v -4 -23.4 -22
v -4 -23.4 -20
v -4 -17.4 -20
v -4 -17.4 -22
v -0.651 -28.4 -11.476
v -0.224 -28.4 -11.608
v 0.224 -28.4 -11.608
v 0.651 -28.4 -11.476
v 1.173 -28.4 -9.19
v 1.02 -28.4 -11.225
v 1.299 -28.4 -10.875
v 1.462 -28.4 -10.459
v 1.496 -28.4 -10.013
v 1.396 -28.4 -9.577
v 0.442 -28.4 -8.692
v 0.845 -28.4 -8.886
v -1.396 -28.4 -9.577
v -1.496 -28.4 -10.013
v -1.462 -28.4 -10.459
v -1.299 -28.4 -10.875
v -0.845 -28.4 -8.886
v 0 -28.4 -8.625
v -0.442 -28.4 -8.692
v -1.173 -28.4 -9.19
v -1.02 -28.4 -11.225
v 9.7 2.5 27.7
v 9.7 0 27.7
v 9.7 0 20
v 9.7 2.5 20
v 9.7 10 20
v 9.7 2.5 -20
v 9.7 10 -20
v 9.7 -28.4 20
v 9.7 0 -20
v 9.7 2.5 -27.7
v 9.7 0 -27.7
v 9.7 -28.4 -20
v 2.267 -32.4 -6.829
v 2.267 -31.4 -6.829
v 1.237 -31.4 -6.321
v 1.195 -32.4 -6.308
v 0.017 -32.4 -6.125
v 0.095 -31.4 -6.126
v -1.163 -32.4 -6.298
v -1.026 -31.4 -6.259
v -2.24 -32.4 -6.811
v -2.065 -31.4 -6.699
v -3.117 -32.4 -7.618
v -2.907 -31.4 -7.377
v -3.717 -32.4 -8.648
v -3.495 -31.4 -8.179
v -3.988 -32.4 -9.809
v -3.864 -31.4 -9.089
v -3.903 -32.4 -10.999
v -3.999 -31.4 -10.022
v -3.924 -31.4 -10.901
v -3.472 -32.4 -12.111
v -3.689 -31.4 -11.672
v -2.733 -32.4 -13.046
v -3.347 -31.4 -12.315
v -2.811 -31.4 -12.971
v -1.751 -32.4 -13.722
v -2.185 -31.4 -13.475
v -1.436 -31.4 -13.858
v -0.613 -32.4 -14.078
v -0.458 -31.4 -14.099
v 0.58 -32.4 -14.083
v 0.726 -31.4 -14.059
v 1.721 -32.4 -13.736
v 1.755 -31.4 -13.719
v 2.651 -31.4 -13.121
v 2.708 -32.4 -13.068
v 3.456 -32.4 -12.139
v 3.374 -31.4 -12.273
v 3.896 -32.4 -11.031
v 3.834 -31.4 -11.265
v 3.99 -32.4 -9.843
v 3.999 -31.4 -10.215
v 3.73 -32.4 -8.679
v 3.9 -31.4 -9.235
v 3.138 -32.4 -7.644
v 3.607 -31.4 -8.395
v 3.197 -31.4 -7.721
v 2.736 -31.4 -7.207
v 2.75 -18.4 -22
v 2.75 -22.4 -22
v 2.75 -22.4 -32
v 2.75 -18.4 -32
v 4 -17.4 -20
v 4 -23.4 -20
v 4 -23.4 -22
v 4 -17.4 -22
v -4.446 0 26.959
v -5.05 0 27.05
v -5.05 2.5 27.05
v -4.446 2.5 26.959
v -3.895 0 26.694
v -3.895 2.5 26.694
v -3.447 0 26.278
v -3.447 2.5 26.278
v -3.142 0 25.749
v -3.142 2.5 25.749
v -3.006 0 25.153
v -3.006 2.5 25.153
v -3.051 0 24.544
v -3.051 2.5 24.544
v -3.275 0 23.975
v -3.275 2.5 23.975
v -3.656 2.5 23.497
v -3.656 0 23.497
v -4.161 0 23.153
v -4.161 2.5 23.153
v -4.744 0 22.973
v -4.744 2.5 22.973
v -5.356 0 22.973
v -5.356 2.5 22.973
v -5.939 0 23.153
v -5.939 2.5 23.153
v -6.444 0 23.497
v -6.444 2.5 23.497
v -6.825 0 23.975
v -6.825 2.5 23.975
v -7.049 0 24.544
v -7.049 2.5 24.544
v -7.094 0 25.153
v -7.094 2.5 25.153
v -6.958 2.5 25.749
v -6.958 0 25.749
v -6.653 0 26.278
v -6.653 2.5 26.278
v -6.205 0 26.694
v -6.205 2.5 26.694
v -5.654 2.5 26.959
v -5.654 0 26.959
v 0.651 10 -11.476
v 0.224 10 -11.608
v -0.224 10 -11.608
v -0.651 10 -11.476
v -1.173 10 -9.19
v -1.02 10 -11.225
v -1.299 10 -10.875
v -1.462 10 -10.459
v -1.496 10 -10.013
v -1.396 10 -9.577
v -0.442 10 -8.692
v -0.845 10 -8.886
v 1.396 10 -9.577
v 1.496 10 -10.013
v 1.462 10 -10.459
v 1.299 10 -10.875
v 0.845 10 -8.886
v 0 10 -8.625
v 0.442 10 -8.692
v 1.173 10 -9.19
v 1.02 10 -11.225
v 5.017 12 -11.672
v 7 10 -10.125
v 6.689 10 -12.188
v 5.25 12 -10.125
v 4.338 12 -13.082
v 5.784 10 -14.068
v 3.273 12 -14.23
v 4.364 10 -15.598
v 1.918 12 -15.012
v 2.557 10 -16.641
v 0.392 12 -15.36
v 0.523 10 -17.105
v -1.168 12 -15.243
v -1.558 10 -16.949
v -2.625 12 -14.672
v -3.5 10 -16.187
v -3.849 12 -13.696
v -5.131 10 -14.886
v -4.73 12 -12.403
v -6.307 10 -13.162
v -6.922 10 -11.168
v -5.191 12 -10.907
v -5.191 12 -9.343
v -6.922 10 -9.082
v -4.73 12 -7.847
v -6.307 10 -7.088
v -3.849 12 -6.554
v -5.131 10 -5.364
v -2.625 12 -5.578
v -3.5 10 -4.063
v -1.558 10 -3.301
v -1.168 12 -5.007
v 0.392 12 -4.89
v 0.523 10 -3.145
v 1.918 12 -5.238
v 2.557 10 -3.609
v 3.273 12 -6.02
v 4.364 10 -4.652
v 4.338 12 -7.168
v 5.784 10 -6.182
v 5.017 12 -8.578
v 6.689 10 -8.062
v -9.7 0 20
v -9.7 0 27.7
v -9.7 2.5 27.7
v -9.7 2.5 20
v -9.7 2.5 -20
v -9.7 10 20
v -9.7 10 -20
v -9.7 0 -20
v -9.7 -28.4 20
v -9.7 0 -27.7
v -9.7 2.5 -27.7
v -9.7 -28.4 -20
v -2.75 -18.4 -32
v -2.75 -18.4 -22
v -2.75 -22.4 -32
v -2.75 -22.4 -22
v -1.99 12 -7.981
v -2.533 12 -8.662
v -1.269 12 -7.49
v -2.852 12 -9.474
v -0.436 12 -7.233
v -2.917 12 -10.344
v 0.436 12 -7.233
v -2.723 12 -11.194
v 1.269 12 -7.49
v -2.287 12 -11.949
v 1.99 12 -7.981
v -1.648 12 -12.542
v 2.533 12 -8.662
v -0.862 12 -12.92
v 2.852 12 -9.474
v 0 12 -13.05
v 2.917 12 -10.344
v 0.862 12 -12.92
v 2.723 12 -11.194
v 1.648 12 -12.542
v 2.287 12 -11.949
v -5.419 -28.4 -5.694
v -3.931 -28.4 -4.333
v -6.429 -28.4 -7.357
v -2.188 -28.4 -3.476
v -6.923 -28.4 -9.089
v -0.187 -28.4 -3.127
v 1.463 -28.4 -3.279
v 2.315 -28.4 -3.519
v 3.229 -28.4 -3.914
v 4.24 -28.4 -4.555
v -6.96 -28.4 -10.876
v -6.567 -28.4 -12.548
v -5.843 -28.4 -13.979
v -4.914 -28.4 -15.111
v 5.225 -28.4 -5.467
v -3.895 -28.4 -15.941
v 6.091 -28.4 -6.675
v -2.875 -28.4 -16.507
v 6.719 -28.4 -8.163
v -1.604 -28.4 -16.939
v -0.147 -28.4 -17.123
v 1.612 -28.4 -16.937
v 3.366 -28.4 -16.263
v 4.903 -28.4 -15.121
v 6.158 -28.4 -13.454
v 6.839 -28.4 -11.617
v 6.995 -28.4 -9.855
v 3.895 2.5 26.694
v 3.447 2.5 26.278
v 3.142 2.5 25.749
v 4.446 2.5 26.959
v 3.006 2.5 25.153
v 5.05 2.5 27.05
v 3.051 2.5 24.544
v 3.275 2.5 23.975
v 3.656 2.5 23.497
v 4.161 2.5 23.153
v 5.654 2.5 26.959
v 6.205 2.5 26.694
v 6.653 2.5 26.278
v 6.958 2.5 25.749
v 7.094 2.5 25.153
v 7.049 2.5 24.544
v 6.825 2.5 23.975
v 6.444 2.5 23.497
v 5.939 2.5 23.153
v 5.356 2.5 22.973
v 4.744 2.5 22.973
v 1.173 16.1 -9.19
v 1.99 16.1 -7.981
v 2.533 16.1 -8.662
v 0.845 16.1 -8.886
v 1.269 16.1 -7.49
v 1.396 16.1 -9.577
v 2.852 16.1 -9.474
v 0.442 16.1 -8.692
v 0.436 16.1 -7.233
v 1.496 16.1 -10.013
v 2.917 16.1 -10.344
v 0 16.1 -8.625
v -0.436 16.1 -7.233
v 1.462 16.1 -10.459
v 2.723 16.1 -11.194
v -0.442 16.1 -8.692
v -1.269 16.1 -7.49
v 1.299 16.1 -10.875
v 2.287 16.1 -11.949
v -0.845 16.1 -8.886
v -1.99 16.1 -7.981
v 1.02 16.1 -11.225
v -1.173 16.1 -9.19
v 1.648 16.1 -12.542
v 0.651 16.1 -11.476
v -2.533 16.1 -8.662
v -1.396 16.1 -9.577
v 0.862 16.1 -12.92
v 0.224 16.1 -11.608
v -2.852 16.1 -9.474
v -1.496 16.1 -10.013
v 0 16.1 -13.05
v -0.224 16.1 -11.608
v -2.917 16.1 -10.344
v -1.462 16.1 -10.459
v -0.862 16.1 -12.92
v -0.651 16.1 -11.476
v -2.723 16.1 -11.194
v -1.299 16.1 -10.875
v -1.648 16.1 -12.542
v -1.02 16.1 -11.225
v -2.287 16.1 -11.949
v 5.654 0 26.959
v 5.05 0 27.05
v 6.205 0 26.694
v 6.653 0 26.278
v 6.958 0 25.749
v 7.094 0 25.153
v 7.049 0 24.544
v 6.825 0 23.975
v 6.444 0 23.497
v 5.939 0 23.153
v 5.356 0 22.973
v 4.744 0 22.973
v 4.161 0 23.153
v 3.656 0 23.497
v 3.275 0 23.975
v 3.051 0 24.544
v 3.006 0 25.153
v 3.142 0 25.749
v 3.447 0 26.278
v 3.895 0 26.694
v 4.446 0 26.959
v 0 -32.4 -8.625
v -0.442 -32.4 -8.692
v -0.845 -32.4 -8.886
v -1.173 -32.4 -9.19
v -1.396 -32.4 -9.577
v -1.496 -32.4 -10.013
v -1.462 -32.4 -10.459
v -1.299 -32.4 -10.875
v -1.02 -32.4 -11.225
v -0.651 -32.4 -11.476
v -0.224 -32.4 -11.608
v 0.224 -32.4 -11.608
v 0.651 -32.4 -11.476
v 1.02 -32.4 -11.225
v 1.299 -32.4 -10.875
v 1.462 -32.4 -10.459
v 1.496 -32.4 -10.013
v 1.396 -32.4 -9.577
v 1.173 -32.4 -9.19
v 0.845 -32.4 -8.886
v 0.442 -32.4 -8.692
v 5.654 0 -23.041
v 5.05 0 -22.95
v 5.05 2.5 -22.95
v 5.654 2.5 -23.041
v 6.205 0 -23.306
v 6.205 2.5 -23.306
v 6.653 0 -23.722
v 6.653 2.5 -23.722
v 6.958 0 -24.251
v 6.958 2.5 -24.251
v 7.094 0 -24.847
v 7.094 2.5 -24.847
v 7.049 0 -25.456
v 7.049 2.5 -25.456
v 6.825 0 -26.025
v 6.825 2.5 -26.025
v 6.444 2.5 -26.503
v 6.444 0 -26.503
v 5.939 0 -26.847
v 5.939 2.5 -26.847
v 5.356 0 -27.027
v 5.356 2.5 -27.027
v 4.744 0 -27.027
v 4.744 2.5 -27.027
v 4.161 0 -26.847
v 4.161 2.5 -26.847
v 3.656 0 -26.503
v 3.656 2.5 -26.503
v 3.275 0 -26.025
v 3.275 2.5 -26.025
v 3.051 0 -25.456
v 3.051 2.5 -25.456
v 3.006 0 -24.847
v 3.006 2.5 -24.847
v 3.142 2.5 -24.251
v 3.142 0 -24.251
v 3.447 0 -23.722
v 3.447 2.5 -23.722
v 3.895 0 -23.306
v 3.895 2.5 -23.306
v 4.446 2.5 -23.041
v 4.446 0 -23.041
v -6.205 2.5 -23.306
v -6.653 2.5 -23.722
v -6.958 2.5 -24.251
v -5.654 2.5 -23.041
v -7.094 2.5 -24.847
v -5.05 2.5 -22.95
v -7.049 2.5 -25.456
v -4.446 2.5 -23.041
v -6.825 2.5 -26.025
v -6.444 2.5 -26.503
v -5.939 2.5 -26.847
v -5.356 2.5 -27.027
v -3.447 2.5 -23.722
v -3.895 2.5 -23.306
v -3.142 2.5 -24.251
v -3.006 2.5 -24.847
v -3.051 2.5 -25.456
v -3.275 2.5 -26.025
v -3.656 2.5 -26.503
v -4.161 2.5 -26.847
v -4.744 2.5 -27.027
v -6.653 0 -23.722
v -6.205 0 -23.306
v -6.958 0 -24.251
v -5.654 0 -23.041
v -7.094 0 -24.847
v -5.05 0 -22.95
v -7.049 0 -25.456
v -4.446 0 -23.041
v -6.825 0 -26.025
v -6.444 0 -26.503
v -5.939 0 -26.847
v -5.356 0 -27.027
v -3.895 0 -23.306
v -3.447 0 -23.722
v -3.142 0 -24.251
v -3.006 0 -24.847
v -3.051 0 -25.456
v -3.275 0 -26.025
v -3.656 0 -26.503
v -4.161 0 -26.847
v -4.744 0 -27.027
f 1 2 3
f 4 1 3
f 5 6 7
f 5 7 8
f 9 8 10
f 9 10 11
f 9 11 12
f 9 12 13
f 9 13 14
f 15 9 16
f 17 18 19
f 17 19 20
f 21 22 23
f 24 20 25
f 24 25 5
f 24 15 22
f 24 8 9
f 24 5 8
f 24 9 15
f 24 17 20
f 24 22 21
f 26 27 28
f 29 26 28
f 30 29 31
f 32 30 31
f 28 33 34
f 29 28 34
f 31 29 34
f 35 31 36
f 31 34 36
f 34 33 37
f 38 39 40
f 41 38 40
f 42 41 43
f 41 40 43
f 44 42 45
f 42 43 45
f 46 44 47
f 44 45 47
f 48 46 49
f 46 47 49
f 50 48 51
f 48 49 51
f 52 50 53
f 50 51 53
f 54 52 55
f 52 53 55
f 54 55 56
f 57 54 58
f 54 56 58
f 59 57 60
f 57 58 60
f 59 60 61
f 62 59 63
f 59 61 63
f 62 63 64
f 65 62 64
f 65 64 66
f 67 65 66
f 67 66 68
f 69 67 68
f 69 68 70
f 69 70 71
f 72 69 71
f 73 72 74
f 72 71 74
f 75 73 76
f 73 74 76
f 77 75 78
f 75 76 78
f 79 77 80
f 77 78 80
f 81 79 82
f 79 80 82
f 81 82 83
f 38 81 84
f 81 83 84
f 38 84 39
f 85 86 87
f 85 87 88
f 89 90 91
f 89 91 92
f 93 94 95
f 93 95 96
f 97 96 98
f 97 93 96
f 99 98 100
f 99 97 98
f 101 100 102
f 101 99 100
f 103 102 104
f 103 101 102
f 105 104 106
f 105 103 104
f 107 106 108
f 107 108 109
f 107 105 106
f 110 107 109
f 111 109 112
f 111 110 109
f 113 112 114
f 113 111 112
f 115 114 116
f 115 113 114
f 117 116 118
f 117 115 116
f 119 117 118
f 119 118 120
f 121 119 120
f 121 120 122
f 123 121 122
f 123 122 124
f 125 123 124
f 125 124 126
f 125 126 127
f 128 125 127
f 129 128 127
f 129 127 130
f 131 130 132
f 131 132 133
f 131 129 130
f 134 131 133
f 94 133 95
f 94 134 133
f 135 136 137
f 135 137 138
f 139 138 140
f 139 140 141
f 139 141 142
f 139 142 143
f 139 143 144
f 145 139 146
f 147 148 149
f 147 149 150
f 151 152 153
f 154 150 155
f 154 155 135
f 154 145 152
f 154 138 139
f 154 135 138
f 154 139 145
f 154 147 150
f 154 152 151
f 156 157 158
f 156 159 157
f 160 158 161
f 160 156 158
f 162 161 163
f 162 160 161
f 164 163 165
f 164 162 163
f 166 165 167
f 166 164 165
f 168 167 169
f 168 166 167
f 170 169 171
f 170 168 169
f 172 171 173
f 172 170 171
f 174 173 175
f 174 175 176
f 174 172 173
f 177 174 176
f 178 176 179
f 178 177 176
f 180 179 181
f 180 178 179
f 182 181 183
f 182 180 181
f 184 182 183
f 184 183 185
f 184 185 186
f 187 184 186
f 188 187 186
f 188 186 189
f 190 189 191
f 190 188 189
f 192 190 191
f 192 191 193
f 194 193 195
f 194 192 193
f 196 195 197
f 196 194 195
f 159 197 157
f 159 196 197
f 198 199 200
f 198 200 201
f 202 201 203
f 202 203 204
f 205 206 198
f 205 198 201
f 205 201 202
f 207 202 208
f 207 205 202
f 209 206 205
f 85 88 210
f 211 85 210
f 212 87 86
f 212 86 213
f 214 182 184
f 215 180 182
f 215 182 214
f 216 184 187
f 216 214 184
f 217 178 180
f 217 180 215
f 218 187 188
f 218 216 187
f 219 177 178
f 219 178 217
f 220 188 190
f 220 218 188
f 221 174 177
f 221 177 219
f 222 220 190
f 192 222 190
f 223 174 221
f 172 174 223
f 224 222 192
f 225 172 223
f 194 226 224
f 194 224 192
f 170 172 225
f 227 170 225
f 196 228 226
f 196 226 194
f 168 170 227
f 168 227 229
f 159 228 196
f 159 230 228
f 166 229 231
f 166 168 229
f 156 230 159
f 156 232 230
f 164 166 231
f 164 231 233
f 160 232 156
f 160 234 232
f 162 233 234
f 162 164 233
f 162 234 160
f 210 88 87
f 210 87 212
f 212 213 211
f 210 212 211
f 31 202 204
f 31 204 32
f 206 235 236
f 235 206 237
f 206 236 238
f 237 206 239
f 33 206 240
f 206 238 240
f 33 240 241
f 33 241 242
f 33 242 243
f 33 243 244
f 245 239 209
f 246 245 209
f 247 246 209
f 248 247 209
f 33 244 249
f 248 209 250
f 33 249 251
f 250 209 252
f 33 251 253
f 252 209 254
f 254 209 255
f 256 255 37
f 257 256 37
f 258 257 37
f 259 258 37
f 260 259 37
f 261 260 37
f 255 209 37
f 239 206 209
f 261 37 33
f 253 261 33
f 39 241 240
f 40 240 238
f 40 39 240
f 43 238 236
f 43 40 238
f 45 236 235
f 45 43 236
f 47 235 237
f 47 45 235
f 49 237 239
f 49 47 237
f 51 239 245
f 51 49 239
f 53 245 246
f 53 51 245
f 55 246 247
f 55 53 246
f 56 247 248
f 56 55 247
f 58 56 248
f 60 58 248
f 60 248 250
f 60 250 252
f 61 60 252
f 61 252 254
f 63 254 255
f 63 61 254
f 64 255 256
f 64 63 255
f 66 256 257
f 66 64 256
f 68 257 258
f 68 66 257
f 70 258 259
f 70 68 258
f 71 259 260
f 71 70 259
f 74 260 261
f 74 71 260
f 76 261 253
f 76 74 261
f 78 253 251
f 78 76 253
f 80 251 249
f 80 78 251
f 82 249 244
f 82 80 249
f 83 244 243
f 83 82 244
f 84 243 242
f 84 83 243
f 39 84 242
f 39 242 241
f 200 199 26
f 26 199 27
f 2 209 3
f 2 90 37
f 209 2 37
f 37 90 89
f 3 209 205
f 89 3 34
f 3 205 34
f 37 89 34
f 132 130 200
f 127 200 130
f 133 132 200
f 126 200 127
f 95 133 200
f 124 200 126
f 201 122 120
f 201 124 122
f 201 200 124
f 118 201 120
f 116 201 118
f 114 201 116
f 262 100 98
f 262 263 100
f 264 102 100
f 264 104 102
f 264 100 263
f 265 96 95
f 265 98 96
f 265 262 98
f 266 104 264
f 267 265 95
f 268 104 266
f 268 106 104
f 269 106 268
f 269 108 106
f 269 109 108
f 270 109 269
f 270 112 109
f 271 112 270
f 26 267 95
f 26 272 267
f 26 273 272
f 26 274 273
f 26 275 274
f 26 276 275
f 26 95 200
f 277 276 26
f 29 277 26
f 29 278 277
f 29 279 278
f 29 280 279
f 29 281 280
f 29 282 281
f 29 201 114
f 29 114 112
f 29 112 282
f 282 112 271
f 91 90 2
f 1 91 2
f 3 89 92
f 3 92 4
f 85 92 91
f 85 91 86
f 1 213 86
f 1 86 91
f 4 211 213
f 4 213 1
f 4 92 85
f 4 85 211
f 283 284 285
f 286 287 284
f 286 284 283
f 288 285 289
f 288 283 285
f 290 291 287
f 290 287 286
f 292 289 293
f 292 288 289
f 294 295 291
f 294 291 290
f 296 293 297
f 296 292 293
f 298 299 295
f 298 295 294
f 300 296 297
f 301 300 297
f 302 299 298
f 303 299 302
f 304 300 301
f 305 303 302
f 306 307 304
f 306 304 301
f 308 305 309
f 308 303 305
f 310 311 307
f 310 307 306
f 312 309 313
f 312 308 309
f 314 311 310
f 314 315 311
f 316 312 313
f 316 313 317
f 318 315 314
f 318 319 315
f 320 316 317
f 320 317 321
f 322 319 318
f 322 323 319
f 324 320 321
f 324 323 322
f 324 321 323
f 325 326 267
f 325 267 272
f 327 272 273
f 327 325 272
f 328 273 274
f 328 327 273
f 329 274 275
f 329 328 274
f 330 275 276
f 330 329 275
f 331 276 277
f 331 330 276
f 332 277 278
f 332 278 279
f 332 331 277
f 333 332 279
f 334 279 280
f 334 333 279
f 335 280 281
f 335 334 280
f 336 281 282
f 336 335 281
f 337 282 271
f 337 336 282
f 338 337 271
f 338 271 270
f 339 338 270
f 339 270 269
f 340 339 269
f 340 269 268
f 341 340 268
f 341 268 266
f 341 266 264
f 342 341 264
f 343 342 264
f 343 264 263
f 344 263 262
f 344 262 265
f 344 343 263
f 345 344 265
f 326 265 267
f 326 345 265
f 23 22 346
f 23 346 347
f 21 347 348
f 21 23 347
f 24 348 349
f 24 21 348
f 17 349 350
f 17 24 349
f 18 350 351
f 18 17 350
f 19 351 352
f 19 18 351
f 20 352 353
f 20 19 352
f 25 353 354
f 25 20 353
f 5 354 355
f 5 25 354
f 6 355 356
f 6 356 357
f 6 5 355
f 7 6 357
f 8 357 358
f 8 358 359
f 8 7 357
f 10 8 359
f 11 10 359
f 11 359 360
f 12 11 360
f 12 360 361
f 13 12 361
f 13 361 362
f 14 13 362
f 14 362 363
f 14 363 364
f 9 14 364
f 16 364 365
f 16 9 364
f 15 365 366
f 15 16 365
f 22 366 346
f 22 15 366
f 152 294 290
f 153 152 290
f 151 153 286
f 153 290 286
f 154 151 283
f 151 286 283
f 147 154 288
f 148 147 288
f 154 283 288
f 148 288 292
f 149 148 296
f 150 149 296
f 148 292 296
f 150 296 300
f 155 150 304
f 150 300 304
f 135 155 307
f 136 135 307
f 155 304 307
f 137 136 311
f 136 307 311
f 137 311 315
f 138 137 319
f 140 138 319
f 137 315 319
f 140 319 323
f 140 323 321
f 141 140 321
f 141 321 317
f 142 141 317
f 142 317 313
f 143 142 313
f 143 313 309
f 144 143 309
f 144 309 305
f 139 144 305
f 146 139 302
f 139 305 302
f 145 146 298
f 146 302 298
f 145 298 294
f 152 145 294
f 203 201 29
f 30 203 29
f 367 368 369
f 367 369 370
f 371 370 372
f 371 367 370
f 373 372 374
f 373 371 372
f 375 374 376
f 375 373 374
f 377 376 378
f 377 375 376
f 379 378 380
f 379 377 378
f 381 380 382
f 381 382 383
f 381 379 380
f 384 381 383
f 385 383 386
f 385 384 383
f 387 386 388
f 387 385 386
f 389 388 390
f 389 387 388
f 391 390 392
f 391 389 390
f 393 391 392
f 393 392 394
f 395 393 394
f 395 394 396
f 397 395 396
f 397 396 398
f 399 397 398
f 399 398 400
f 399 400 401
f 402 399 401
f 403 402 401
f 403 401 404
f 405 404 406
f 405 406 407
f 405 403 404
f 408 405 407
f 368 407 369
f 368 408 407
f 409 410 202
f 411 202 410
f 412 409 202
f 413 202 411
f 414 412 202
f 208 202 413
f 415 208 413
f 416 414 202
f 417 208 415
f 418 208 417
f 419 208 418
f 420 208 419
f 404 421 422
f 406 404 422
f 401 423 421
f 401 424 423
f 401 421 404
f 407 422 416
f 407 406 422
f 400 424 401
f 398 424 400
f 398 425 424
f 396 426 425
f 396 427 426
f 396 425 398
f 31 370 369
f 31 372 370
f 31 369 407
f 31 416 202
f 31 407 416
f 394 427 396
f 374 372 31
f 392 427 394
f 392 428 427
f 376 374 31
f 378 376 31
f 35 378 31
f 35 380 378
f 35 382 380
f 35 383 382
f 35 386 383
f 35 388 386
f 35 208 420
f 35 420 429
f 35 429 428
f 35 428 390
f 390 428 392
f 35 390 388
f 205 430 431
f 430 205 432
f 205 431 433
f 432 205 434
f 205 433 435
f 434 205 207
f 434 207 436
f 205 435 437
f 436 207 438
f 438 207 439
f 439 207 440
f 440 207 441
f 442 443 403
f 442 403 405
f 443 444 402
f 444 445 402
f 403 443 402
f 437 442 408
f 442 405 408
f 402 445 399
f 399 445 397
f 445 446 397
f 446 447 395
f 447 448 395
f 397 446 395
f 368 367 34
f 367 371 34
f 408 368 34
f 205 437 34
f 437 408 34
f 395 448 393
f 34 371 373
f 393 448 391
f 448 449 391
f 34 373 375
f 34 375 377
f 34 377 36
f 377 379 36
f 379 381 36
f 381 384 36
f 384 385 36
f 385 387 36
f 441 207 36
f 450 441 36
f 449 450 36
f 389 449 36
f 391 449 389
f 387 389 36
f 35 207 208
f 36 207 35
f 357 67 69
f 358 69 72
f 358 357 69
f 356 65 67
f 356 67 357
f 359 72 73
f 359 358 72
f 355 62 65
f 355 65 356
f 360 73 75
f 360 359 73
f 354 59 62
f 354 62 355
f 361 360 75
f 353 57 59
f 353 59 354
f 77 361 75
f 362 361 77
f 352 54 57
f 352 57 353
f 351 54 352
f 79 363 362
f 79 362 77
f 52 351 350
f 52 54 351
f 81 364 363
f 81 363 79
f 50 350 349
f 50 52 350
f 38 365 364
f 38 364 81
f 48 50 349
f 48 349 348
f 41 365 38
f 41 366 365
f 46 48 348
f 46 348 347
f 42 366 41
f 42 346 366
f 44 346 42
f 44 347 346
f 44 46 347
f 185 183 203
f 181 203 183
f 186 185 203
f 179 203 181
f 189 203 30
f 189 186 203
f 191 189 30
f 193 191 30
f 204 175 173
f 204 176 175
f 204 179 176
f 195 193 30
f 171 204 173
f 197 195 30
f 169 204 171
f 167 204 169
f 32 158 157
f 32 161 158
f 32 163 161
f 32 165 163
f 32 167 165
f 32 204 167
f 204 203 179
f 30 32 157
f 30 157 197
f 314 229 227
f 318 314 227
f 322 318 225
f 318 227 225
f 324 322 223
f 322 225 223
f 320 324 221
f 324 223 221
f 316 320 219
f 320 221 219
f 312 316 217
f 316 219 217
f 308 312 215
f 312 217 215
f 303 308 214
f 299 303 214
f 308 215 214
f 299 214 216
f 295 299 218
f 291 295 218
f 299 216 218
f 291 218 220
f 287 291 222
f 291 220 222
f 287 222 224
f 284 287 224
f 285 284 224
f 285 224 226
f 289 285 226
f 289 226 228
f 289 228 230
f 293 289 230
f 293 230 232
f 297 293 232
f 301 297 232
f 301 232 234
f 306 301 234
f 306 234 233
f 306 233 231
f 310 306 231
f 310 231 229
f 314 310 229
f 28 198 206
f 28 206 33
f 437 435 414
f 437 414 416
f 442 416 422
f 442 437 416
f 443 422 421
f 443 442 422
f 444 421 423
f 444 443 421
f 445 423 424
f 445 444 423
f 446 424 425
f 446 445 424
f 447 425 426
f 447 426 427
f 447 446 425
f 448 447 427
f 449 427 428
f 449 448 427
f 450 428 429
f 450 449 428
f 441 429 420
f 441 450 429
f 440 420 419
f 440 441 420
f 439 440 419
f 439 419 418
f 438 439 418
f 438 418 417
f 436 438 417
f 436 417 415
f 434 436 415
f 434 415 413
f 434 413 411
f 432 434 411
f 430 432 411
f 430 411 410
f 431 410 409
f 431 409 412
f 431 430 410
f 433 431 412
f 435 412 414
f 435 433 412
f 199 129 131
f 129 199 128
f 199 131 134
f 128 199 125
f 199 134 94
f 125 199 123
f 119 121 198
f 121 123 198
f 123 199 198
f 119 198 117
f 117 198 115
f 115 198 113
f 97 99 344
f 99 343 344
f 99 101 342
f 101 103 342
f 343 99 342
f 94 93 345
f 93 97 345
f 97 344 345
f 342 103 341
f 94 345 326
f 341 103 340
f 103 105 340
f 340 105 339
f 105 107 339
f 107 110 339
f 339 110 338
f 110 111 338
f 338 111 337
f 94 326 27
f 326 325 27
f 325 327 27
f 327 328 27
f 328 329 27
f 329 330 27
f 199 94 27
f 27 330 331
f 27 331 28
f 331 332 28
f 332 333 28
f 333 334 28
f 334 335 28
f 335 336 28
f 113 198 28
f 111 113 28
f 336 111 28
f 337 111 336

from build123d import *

# Parameters (mm, degrees)
SKETCH_1_W          = 19.4
SKETCH_1_H          = 7.7
SKETCH_1_R          = 2.05
SKETCH_1_H_2        = 40
EXTRUDE_1_DEPTH     = 2.5
SKETCH_1_3_W        = 19.4
SKETCH_1_3_H        = 40
EXTRUDE_2_DEPTH     = 28.4
EXTRUDE_START       = 2.5
SKETCH_1_4_W        = 19.4
SKETCH_1_4_H        = 40
EXTRUDE_3_DEPTH     = 7.5
SKETCH_2_R          = 2.925
EXTRUDE_4_DEPTH     = 6.1
SKETCH_4_2_R        = 4
EXTRUDE_5_DEPTH     = 1
SKETCH_6_R          = 7
SKETCH_7_R          = 5.25
SKETCH_8_R          = 1.5
CUT_EXTRUDE_1_DEPTH = 6.1
CUT_EXTRUDE_START   = -4
SKETCH_9_R          = 1.5
CUT_EXTRUDE_2_DEPTH = 4
SKETCH_10_W         = 8
SKETCH_10_H         = 6
EXTRUDE_6_DEPTH     = 2
SKETCH_11_W         = 5.5
SKETCH_11_H         = 4
EXTRUDE_7_DEPTH     = 10


with BuildPart() as part:
    # 스케치1 → 보스-돌출1 (new body)
    # profile 1 of 3: a face of its own
    with BuildSketch(Plane(origin=(0, 0, 0), x_dir=(1, 0, 0), z_dir=(0, 1, 0))):
        with Locations((0, 23.85)):
            Rectangle(SKETCH_1_W, SKETCH_1_H)
        with Locations(Location((-5.05, 25, 0), (0, 0, 270))):
            Circle(SKETCH_1_R, mode=Mode.SUBTRACT)
        with Locations(Location((5.05, 25, 0), (0, 0, 270))):
            Circle(SKETCH_1_R, mode=Mode.SUBTRACT)
    # profile 2 of 3: a face of its own
    with BuildSketch(Plane(origin=(0, 0, 0), x_dir=(1, 0, 0), z_dir=(0, 1, 0))):
        Rectangle(SKETCH_1_W, SKETCH_1_H_2)
    # profile 3 of 3: a face of its own
    with BuildSketch(Plane(origin=(0, 0, 0), x_dir=(1, 0, 0), z_dir=(0, 1, 0))):
        with Locations((0, -23.85)):
            Rectangle(SKETCH_1_W, SKETCH_1_H)
        with Locations(Location((-5.05, -25, 0), (0, 0, 270))):
            Circle(SKETCH_1_R, mode=Mode.SUBTRACT)
        with Locations(Location((5.05, -25, 0), (0, 0, 270))):
            Circle(SKETCH_1_R, mode=Mode.SUBTRACT)
    extrude(amount=EXTRUDE_1_DEPTH)

    # 스케치1<3> → 보스-돌출2 (add)
    with BuildSketch(Plane(origin=(0, 0, 0), x_dir=(1, 0, 0), z_dir=(0, 1, 0))):
        Rectangle(SKETCH_1_3_W, SKETCH_1_3_H)
    extrude(amount=-EXTRUDE_2_DEPTH)

    # 스케치1<4> → 보스-돌출3 (add)
    with BuildSketch(Plane(origin=(0, 0, 0), x_dir=(1, 0, 0), z_dir=(0, 1, 0)).offset(EXTRUDE_START)):
        Rectangle(SKETCH_1_4_W, SKETCH_1_4_H)
    extrude(amount=EXTRUDE_3_DEPTH)

    # 스케치2 → 보스-돌출4 (add)
    with BuildSketch(Plane(origin=(0, 10, 0), x_dir=(1, 0, 0), z_dir=(0, 1, 0))):
        with Locations(Location((0, 10.125, 0), (0, 0, 90))):
            Circle(SKETCH_2_R)
    extrude(amount=EXTRUDE_4_DEPTH)

    # 로프트1: read off the stored shape, not the designer's step
    # 로프트1: loft between two sections, ruled curve by curve
    loft_1_from = [
        Edge.make_bspline([(1.462551233, -28.4, -3.279494621), (-12.228459525, -28.4, -0.354392156), (-15.15356199, -28.4, -14.045402913), (-1.462551233, -28.4, -16.970505379), (12.228459525, -28.4, -19.895607844), (15.15356199, -28.4, -6.204597087), (1.462551233, -28.4, -3.279494621)], [0, 0, 0, 0, 0.5, 0.5, 0.5, 1, 1, 1, 1], 3, [1, 0.333333333, 0.333333333, 1, 0.333333333, 0.333333333, 1]),
    ]
    loft_1_to = [
        Edge.make_bspline([(2.267005586, -31.4, -6.829444557), (-4.3241053, -31.4, -2.295433386), (-8.858116471, -31.4, -8.886544271), (-2.267005586, -31.4, -13.420555443), (4.3241053, -31.4, -17.954566614), (8.858116471, -31.4, -11.363455729), (2.267005586, -31.4, -6.829444557)], [0, 0, 0, 0, 0.5, 0.5, 0.5, 1, 1, 1, 1], 3, [1, 0.333333333, 0.333333333, 1, 0.333333333, 0.333333333, 1]),
    ]
    loft_1 = Solid(Shell([*[Face.make_surface_from_curves(loft_1_from[k], loft_1_to[k]) for k in range(1)], Face(Wire(loft_1_from)), Face(Wire(loft_1_to))]))
    add(loft_1)

    # 스케치4<2> → 보스-돌출5 (add)
    with BuildSketch(Plane(origin=(0, -31.4, 0), x_dir=(-1, 0, 0), z_dir=(0, -1, 0))):
        with Locations(Location((0, 10.125, 0), (0, 0, 235.476))):
            Circle(SKETCH_4_2_R)
    extrude(amount=EXTRUDE_5_DEPTH)

    # 스케치6 → 로프트2 section 0
    with BuildSketch(Plane(origin=(0, 10, 0), x_dir=(1, 0, 0), z_dir=(0, 1, 0))):
        with Locations((0, 10.125)):
            Circle(SKETCH_6_R)
    # 스케치7 → 로프트2 section 1
    with BuildSketch(Plane(origin=(0, 12, 0), x_dir=(1, 0, 0), z_dir=(0, 1, 0))):
        with Locations((0, 10.125)):
            Circle(SKETCH_7_R)
    loft()

    # 스케치8 → 컷-돌출1 (cut)
    with BuildSketch(Plane(origin=(0, 16.1, 0), x_dir=(1, 0, 0), z_dir=(0, 1, 0))):
        with Locations(Location((0, 10.125, 0), (0, 0, 270))):
            Circle(SKETCH_8_R)
    extrude(amount=-CUT_EXTRUDE_1_DEPTH, mode=Mode.SUBTRACT)

    # 스케치9 → 컷-돌출2 (cut)
    with BuildSketch(Plane.XZ.offset(32.4).offset(CUT_EXTRUDE_START)):
        with Locations(Location((0, -10.125, 0), (0, 0, 90))):
            Circle(SKETCH_9_R)
    extrude(amount=CUT_EXTRUDE_2_DEPTH, mode=Mode.SUBTRACT)

    # 스케치10 → 보스-돌출6 (add)
    with BuildSketch(Plane(origin=(0, 0, -20), x_dir=(-1, 0, 0), z_dir=(0, 0, -1))):
        with Locations((0, -20.4)):
            Rectangle(SKETCH_10_W, SKETCH_10_H)
    extrude(amount=EXTRUDE_6_DEPTH)

    # 스케치11 → 보스-돌출7 (add)
    with BuildSketch(Plane(origin=(0, 0, -22), x_dir=(-1, 0, 0), z_dir=(0, 0, -1))):
        with Locations((0, -20.4)):
            Rectangle(SKETCH_11_W, SKETCH_11_H)
    extrude(amount=EXTRUDE_7_DEPTH)


solid = part.part
